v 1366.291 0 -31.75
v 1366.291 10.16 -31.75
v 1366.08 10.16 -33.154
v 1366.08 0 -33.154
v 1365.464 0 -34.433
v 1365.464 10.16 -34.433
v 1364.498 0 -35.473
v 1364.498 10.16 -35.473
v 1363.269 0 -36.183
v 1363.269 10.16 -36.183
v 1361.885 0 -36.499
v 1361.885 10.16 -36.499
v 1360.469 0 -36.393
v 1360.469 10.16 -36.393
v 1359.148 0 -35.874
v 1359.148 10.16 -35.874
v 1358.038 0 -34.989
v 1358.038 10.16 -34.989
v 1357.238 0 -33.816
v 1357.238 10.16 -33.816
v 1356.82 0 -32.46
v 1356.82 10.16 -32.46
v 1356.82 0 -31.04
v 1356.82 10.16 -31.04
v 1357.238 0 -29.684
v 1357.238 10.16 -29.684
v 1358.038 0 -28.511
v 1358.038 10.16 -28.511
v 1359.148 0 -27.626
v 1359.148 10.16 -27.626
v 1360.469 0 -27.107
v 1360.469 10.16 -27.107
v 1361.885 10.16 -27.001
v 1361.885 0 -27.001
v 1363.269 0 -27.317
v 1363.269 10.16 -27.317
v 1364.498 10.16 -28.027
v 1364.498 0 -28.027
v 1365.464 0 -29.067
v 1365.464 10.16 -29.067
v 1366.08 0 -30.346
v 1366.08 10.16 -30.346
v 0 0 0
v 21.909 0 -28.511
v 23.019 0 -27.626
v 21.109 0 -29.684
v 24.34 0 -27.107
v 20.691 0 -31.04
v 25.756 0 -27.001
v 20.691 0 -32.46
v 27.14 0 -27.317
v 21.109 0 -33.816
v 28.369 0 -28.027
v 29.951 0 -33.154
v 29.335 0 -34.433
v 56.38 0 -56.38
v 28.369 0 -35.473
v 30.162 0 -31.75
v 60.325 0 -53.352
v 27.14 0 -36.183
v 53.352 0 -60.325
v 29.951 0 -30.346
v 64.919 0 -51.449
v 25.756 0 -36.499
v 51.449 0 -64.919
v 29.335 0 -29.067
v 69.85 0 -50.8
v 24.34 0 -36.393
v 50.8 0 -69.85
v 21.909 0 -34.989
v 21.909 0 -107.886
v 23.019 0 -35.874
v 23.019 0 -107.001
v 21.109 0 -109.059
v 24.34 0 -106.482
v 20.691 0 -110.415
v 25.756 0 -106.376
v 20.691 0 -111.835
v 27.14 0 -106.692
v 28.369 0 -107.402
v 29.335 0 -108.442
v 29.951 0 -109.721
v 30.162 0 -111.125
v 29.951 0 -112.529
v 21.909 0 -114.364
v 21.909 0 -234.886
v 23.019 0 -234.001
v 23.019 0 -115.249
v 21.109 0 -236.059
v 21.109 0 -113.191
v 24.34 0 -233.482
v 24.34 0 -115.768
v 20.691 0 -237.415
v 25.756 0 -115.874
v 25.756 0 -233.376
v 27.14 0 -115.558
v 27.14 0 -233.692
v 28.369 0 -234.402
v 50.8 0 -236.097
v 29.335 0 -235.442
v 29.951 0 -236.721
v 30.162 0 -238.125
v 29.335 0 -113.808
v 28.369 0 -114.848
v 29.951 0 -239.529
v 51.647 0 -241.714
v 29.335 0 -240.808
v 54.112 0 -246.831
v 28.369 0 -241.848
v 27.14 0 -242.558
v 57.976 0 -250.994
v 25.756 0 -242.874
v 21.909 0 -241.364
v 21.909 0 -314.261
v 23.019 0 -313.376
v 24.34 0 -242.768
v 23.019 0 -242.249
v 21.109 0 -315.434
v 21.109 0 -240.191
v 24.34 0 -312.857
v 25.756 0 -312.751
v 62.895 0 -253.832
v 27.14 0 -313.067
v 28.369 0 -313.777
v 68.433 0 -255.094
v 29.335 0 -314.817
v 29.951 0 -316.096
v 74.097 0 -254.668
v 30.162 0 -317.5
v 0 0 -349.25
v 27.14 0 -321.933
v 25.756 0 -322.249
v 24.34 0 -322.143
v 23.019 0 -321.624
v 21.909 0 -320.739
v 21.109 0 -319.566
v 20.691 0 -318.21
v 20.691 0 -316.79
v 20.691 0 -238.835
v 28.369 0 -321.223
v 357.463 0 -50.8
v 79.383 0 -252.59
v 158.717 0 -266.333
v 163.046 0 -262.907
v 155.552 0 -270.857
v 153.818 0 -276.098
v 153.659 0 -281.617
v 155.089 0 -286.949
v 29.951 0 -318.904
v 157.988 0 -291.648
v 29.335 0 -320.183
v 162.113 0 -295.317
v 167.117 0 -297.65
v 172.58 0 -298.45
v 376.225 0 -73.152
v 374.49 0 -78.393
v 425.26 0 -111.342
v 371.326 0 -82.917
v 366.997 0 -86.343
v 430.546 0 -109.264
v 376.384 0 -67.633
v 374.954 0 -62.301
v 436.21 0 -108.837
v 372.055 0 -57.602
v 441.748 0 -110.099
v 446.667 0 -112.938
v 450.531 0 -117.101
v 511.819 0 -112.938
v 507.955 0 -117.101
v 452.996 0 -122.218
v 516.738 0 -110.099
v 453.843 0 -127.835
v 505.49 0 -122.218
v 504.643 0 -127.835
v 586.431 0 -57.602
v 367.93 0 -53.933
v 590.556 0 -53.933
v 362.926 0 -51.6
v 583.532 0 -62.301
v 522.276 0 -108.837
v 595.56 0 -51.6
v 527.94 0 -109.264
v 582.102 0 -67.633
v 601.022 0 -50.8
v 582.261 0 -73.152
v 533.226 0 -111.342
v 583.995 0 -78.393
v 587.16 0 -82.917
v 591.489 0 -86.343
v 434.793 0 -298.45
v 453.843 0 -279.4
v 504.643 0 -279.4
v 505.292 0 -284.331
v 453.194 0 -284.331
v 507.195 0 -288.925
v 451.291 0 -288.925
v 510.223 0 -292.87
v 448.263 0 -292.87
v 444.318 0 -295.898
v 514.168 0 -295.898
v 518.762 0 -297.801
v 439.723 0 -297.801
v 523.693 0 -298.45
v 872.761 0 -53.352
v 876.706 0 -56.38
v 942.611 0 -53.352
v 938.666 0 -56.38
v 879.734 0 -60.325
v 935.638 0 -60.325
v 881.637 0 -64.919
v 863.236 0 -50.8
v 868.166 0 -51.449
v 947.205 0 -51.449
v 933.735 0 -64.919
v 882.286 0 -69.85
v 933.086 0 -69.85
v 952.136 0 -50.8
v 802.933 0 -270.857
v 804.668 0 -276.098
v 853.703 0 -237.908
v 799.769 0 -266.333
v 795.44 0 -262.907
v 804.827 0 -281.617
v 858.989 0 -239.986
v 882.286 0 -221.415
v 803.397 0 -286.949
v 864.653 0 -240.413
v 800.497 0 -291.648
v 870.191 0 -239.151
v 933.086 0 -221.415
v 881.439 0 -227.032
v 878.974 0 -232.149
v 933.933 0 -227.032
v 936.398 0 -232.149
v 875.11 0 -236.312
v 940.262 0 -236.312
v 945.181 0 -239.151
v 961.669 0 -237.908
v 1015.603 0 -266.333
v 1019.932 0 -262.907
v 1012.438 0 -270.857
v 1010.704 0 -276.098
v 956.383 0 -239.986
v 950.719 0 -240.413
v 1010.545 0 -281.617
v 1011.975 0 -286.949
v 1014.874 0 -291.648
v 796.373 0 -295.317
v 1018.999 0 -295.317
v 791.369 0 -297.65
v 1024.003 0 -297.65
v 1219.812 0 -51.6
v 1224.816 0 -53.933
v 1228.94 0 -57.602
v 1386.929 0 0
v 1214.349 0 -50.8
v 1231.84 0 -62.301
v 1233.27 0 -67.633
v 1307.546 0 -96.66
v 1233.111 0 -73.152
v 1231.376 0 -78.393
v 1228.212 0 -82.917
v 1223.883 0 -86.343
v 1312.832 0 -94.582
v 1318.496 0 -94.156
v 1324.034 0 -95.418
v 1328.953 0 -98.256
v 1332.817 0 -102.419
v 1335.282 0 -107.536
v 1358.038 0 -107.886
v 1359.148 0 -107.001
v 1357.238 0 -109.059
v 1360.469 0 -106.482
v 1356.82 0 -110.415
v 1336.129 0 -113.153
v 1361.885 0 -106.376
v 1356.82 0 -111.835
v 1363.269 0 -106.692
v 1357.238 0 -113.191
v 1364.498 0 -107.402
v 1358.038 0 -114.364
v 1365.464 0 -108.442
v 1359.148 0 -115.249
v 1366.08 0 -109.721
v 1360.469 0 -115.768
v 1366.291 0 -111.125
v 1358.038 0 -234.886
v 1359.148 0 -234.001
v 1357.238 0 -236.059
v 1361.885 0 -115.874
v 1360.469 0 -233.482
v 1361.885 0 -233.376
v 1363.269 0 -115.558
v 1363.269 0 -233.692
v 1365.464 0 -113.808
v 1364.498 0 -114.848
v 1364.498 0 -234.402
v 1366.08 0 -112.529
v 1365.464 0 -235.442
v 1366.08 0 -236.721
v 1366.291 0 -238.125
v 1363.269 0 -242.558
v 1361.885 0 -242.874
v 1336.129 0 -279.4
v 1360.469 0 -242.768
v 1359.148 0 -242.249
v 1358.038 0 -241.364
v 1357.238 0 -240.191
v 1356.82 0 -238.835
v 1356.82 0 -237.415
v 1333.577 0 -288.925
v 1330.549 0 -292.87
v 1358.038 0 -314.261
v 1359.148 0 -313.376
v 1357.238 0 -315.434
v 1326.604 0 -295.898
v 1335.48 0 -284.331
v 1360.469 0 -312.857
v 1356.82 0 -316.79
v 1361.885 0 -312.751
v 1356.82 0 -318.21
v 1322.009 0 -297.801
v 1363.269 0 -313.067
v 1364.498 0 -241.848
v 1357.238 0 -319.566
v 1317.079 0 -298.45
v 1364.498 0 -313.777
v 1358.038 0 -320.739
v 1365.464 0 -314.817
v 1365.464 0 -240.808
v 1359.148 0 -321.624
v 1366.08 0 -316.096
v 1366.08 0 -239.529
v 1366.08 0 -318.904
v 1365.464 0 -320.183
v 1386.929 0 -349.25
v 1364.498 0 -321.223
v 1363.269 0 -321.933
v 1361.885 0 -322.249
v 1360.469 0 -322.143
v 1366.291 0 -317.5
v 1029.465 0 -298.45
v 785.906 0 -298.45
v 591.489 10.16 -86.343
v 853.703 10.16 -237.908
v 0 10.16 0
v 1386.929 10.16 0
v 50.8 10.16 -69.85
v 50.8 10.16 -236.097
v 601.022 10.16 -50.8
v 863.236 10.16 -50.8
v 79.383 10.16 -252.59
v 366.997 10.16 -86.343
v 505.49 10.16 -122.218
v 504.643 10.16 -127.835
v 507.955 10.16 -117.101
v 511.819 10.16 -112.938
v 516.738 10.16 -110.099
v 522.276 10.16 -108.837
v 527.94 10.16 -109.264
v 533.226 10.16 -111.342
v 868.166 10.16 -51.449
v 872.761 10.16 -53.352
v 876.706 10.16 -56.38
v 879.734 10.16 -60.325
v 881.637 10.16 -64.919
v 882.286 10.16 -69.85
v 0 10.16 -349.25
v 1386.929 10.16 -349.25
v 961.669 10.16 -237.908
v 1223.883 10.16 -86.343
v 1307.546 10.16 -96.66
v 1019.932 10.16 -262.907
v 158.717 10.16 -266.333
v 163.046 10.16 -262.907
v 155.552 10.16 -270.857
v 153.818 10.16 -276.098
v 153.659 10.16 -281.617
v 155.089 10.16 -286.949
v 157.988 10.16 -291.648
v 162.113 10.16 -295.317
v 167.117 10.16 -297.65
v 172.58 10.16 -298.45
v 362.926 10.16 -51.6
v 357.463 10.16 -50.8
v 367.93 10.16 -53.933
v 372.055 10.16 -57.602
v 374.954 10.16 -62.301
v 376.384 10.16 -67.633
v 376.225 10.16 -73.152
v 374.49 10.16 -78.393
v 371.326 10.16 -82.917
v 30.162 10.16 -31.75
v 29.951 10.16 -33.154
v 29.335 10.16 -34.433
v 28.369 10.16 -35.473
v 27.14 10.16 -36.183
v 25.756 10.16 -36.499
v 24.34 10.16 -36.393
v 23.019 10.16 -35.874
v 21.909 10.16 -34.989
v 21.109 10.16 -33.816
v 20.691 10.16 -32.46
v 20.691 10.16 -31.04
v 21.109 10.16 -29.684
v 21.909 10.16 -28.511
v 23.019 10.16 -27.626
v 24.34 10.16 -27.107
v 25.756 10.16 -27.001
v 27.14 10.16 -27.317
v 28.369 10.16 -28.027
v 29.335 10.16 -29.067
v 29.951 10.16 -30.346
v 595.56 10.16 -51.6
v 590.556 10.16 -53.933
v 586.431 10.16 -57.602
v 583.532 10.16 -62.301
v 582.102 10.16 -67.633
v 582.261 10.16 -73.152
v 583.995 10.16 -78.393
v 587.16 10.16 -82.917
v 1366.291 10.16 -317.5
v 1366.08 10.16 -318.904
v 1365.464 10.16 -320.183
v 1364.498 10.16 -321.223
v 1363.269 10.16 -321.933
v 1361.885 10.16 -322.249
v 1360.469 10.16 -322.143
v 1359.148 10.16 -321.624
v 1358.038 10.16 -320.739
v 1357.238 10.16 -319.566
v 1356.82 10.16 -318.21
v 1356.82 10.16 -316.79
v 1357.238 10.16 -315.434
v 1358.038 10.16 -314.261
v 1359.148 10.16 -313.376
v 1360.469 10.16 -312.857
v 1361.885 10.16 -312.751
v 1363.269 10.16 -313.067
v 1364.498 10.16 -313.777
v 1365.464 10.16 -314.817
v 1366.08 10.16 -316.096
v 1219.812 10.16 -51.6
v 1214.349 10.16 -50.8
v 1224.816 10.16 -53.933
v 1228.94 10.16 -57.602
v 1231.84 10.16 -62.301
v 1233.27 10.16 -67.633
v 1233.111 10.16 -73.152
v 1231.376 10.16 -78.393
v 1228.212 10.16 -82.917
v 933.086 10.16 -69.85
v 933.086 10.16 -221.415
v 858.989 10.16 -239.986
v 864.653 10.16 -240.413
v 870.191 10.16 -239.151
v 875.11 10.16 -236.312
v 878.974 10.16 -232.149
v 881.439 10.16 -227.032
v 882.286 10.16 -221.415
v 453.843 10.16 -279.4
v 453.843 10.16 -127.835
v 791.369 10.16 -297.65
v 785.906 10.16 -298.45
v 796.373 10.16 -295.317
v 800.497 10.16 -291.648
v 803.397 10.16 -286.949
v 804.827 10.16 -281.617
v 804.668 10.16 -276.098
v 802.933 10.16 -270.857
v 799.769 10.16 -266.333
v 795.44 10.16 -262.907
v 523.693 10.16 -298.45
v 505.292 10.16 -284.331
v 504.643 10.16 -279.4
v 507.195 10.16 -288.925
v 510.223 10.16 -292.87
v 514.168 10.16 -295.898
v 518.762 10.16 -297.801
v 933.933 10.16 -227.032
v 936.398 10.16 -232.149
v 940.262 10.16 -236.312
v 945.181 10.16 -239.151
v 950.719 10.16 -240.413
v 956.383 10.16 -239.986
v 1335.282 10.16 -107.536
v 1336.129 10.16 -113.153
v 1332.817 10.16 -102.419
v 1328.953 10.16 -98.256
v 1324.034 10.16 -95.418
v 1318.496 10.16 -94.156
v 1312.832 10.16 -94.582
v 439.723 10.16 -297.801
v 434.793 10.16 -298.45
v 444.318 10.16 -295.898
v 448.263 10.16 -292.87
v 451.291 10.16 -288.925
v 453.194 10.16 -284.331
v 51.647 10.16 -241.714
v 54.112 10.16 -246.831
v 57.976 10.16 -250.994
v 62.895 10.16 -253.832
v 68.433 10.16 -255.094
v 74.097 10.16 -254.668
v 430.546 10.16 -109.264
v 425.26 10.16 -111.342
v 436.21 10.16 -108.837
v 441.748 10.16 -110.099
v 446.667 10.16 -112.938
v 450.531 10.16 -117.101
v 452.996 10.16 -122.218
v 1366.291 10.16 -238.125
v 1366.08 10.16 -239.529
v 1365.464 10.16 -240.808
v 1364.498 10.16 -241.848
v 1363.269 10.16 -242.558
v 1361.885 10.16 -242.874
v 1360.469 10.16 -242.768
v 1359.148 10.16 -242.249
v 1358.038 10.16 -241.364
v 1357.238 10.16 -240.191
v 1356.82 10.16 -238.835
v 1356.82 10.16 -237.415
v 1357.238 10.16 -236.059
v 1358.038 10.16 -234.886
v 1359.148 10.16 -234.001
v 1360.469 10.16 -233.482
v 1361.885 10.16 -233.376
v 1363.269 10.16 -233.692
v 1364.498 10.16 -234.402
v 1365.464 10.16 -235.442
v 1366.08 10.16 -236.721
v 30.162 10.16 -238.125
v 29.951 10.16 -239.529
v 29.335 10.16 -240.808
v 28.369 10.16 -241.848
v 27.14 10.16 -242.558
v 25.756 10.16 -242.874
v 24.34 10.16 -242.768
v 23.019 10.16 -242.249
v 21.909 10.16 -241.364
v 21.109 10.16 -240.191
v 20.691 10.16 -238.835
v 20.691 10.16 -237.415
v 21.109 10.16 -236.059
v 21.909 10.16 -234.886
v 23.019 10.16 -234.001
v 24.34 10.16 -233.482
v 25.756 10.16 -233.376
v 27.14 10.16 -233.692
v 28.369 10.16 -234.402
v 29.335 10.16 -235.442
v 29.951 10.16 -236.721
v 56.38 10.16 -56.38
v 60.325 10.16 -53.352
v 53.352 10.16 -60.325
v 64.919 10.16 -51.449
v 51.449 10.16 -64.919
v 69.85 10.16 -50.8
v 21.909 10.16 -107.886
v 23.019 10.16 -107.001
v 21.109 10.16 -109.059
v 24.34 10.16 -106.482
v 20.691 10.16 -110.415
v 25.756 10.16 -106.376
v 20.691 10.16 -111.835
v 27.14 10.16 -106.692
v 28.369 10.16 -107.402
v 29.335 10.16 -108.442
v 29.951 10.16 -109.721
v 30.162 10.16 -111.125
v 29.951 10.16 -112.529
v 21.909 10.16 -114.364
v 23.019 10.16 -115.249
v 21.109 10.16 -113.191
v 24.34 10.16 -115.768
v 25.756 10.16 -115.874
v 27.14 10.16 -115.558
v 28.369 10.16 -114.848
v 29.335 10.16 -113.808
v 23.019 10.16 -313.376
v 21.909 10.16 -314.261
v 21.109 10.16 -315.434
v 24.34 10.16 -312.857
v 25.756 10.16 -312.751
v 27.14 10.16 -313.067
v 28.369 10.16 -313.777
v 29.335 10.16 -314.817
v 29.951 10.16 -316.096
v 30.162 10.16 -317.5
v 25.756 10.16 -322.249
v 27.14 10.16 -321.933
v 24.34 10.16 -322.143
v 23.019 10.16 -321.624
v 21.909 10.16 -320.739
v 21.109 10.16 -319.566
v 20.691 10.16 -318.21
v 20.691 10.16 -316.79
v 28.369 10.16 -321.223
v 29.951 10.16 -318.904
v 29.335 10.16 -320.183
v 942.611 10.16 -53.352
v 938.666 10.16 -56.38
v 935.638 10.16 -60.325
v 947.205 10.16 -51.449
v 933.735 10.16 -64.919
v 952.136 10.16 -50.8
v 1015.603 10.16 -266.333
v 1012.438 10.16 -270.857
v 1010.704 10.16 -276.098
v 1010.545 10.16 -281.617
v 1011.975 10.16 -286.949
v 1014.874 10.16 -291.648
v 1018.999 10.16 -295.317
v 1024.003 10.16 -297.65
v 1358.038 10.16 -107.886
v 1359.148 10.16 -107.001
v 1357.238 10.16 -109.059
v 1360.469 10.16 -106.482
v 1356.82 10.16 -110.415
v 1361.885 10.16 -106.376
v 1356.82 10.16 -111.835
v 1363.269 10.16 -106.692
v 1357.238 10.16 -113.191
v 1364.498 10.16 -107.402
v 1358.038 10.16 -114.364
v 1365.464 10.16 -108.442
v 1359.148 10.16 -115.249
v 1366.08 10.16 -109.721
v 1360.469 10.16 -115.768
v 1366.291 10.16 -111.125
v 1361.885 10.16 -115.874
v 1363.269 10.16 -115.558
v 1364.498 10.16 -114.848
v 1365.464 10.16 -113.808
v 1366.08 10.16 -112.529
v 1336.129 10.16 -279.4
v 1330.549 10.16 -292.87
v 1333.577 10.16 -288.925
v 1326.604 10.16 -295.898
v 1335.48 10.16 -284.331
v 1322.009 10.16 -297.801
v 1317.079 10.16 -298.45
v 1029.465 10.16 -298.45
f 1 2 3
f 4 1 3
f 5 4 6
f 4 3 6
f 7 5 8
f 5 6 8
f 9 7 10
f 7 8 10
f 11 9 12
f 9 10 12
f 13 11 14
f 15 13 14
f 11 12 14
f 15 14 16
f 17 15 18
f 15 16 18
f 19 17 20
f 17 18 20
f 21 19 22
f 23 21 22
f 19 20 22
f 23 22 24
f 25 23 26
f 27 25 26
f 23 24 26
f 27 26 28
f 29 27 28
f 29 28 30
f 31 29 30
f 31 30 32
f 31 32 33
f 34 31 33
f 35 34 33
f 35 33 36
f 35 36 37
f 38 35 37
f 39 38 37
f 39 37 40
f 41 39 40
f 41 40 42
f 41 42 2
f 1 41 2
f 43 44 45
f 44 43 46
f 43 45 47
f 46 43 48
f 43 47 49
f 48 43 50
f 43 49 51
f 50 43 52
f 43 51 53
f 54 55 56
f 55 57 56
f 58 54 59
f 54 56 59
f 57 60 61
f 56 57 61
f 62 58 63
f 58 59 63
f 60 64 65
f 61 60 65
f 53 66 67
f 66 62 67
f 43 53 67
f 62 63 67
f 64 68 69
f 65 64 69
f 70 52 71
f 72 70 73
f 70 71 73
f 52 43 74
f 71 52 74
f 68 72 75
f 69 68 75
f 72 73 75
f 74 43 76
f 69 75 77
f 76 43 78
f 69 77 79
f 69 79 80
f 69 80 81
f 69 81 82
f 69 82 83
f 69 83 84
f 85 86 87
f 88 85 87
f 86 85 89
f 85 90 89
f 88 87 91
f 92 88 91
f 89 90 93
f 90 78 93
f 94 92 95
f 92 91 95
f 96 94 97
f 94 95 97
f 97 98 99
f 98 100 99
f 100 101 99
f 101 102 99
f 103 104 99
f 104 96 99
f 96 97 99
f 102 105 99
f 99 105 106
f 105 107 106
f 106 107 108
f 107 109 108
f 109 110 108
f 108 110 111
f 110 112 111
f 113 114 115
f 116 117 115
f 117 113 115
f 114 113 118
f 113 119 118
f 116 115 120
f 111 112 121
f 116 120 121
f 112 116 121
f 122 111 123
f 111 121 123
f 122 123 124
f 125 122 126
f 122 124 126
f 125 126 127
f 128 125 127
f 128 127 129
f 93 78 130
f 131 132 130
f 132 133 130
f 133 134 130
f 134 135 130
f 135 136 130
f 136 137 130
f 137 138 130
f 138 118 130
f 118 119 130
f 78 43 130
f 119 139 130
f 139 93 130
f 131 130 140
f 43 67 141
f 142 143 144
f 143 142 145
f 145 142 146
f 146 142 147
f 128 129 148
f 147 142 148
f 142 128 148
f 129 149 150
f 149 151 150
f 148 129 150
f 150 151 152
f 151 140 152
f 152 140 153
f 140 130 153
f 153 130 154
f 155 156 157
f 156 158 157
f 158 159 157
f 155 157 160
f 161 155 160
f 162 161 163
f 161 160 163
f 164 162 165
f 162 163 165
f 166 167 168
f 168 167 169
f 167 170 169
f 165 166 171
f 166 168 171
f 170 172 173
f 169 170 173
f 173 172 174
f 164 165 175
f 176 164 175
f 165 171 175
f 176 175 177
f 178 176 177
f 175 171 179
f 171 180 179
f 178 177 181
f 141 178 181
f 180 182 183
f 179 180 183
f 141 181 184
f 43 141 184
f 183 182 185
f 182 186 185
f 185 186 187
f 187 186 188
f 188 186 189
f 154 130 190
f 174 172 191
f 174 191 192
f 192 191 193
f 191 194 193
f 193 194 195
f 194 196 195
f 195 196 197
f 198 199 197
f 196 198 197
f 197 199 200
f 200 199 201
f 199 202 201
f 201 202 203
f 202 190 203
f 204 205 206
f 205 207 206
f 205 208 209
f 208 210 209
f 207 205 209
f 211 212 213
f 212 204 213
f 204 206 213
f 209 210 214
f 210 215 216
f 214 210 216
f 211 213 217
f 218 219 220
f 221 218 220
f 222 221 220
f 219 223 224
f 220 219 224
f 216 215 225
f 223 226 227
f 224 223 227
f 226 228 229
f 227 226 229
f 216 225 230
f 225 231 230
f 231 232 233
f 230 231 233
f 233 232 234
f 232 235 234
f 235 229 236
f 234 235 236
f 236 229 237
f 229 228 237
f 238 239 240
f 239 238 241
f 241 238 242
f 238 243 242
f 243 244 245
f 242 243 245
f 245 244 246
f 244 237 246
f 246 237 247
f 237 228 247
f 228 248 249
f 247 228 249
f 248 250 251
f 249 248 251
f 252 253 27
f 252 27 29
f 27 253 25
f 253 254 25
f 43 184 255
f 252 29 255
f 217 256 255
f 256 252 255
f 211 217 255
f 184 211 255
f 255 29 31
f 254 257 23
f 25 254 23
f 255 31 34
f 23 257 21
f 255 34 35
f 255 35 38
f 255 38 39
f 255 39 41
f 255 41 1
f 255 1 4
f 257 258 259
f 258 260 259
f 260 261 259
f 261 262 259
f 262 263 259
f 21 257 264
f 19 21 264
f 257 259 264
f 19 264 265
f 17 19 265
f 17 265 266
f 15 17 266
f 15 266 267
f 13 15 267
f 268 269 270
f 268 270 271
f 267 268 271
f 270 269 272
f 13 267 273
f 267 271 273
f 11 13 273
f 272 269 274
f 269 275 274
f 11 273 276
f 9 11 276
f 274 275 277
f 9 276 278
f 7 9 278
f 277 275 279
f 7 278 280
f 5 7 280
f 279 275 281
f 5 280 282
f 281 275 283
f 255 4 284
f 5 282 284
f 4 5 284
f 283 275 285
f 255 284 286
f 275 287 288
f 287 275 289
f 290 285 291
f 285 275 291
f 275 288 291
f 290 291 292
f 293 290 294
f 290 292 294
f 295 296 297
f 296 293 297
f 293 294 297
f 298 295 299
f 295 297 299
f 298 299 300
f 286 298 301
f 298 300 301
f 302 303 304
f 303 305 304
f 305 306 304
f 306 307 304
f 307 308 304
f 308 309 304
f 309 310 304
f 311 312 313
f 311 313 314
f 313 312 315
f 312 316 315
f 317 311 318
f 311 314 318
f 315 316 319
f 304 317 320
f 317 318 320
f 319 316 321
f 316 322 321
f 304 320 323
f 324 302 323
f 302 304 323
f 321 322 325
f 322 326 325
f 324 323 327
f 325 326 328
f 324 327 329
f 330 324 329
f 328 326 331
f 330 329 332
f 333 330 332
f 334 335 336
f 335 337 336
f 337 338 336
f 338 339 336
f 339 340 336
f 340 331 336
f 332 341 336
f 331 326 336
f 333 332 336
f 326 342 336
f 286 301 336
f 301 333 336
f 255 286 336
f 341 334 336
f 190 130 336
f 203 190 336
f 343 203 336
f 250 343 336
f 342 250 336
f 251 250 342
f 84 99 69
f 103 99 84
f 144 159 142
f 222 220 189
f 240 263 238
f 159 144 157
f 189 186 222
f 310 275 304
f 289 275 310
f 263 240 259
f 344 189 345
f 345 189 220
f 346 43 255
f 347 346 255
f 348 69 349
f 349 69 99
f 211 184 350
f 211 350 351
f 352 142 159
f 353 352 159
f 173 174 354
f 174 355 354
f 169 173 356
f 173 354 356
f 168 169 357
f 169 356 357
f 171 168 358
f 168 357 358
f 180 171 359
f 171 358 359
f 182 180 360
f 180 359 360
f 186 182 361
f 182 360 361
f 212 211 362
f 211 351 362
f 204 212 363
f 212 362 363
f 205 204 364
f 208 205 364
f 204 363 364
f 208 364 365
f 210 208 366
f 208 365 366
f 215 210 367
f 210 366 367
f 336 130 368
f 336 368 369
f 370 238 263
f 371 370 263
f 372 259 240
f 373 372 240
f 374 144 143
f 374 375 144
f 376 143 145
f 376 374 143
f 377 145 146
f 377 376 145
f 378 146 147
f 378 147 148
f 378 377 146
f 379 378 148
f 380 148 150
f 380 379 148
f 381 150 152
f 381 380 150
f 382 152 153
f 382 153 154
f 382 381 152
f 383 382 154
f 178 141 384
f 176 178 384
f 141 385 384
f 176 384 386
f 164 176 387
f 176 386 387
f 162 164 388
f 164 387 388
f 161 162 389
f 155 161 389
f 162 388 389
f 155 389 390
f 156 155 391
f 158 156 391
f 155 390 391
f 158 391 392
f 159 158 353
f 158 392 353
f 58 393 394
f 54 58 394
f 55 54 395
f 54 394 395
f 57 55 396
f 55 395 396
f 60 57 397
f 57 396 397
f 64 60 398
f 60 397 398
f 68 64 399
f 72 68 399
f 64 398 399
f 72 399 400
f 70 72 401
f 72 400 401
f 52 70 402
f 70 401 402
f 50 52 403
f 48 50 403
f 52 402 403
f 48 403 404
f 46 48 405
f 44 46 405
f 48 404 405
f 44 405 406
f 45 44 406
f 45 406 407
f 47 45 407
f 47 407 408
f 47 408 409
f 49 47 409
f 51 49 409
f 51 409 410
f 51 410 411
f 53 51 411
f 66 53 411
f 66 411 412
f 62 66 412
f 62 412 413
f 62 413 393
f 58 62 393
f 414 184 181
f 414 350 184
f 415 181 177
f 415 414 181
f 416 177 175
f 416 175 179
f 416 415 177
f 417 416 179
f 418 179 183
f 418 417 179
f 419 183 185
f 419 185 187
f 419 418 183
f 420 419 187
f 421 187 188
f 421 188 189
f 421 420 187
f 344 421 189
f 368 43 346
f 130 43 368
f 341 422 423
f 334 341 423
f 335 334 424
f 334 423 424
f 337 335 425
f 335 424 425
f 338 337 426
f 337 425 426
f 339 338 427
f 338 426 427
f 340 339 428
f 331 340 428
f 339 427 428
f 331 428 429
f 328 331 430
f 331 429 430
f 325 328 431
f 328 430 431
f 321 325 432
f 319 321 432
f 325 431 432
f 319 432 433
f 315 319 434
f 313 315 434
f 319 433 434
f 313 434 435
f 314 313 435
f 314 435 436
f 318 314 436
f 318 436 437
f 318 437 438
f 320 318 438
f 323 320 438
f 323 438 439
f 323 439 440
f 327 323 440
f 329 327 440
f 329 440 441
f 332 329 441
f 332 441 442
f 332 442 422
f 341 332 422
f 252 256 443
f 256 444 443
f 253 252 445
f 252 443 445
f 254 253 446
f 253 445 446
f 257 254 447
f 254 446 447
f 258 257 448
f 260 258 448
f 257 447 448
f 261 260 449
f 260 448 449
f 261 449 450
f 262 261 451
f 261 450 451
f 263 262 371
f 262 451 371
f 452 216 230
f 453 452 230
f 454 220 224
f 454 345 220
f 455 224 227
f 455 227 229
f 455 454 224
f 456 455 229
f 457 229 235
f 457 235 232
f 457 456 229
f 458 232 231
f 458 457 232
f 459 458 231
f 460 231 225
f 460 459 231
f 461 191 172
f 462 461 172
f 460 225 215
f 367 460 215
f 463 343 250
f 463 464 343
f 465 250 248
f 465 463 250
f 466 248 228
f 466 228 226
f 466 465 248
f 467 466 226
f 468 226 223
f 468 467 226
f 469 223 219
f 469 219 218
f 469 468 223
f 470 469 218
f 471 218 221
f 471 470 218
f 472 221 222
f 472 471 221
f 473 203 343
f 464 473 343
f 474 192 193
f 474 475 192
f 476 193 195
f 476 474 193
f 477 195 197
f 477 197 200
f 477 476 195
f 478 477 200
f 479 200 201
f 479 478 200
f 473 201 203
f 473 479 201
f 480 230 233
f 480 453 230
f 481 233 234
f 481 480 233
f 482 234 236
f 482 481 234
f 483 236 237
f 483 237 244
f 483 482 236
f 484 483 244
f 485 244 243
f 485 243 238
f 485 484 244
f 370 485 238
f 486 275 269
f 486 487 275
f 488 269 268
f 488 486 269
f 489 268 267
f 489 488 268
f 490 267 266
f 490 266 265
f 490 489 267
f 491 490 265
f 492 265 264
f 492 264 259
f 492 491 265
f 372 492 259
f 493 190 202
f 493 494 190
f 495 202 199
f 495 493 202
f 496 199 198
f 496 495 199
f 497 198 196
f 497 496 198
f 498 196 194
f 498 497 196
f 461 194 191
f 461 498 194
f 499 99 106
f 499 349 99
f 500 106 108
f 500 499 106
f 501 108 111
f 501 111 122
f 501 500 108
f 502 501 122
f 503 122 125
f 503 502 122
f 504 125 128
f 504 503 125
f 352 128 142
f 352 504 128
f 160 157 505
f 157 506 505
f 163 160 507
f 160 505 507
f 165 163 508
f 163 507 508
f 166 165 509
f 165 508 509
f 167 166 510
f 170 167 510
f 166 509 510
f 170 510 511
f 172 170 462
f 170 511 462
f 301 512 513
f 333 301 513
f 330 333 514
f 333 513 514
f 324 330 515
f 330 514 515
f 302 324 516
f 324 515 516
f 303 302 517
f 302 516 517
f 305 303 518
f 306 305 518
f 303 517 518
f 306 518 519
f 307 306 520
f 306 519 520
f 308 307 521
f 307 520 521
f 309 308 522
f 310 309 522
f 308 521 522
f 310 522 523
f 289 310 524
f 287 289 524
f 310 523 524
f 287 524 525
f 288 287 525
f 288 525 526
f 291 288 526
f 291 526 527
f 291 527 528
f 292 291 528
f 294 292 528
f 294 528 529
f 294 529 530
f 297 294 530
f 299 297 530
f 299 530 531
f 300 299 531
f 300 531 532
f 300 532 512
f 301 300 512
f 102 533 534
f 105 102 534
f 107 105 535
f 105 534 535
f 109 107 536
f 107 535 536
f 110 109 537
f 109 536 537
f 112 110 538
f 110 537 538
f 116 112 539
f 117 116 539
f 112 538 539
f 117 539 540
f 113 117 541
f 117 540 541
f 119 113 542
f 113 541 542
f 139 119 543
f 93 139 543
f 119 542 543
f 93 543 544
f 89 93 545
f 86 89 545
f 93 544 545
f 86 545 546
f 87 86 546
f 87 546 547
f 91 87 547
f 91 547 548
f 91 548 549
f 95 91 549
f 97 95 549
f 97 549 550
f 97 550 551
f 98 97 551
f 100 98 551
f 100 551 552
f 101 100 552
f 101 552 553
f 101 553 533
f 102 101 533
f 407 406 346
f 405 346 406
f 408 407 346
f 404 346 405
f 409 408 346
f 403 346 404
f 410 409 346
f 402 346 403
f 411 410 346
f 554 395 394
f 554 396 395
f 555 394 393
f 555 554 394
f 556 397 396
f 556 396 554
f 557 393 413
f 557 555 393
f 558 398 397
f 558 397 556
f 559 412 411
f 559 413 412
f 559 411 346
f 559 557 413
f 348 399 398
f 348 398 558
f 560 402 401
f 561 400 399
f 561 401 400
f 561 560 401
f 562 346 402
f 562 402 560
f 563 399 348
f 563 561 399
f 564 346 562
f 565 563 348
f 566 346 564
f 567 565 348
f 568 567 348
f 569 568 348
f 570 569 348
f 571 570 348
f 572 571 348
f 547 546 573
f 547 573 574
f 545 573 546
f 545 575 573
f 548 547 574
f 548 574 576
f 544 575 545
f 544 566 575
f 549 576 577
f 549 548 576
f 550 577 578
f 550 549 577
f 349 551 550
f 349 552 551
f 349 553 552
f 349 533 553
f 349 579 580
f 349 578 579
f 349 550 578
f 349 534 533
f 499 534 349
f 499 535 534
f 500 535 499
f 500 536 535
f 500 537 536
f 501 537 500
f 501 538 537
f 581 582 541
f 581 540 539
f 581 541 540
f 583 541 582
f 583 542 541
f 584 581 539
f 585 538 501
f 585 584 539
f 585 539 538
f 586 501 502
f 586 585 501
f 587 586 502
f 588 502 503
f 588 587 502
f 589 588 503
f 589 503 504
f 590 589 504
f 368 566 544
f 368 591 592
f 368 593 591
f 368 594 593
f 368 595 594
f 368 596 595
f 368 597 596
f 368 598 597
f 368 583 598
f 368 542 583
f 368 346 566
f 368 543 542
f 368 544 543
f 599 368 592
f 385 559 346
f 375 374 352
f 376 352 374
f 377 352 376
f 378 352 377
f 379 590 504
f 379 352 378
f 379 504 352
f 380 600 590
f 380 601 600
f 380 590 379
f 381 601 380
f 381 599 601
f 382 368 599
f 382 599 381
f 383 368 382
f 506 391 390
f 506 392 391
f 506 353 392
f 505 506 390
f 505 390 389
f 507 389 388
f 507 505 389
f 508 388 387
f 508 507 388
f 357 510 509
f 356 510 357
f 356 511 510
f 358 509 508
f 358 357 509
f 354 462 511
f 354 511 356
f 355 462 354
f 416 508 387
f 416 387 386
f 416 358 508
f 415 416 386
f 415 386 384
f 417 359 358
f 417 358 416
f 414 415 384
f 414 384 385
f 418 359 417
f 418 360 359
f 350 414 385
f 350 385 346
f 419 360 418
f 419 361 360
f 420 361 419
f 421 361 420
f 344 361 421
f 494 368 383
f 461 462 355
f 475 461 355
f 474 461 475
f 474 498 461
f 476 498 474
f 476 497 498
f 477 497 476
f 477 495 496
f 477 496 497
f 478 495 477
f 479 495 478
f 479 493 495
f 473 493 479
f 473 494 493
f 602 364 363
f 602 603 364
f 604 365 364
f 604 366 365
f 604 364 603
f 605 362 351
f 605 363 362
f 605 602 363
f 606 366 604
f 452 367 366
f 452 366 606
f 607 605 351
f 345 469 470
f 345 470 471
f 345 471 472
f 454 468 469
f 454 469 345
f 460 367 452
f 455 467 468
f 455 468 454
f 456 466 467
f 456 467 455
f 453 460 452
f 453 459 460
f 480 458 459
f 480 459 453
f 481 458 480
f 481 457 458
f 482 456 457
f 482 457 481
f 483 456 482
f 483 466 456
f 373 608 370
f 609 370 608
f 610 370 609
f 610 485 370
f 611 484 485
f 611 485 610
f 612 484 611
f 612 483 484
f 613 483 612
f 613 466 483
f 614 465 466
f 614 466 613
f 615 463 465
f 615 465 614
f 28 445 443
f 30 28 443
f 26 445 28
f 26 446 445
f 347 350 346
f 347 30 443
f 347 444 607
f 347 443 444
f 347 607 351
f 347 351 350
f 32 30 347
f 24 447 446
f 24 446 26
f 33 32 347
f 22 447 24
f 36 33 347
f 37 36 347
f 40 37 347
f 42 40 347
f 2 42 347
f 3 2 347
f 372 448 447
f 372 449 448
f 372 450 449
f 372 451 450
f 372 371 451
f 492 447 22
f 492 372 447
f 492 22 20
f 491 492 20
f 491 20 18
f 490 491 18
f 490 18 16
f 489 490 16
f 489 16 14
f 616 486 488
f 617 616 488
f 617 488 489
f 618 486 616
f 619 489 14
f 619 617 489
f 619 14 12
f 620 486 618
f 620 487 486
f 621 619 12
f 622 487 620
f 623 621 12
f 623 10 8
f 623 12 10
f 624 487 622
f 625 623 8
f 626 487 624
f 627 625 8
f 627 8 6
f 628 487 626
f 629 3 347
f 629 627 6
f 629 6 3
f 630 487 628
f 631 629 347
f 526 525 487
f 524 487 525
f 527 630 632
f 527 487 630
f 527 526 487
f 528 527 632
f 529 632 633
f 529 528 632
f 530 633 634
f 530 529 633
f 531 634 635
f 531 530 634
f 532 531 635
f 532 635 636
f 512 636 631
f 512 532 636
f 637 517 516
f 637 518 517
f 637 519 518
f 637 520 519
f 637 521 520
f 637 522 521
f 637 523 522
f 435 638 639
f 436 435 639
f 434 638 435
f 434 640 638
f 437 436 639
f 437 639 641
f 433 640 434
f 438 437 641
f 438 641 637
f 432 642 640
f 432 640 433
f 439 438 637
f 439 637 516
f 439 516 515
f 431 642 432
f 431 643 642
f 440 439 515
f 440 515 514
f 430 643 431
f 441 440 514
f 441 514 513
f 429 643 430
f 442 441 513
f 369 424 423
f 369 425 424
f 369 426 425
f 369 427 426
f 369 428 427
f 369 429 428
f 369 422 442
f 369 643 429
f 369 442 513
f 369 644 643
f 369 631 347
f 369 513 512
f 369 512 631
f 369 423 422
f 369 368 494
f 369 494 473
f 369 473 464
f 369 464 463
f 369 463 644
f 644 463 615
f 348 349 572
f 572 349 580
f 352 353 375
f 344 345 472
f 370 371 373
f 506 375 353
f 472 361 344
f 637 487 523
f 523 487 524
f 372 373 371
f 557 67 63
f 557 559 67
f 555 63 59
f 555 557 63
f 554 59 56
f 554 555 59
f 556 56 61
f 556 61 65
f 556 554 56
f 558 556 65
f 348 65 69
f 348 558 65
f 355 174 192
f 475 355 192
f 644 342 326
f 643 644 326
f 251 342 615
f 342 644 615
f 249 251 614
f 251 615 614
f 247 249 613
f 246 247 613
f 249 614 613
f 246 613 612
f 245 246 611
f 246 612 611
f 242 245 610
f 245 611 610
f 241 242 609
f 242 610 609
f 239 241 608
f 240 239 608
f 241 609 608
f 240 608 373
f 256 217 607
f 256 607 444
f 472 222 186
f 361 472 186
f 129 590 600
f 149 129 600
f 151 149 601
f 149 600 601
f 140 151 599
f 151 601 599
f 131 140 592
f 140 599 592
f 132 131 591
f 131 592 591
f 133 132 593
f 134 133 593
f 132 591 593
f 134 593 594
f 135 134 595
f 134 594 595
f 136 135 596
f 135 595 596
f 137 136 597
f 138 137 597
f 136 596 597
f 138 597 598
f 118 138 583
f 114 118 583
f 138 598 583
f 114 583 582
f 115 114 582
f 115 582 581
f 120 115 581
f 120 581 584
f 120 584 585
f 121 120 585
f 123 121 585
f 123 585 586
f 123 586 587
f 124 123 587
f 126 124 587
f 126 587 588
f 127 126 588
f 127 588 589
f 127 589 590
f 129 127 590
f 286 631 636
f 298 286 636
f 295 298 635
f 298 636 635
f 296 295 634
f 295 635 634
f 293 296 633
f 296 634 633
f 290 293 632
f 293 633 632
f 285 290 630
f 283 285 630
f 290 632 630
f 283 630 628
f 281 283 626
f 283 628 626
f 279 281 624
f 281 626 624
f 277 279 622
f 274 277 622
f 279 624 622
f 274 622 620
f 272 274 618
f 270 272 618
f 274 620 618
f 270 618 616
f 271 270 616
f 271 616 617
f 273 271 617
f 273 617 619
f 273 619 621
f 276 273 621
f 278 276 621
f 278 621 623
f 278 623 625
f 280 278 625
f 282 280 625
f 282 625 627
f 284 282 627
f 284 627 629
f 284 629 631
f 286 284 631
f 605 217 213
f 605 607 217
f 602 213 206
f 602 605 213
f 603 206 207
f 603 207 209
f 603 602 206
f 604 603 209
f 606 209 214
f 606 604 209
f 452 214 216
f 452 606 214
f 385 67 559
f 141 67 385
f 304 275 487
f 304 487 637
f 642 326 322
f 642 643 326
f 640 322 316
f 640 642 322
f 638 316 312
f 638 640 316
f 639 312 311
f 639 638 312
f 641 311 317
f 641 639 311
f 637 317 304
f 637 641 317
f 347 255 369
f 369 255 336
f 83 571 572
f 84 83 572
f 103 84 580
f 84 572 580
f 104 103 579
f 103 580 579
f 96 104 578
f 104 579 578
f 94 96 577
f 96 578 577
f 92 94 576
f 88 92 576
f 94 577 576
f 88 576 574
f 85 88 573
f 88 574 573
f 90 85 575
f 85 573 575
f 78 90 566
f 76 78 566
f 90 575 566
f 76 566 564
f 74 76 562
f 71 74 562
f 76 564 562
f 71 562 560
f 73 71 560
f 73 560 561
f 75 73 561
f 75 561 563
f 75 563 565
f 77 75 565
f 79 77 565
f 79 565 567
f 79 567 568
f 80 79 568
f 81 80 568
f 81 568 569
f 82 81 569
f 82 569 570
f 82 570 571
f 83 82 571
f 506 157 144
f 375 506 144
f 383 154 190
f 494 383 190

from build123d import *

# Parameters (mm, degrees)
SKETCH1_W           = 1386.9289
SKETCH1_H           = 349.25
SKETCH1_W_2         = 1285.3289
SKETCH1_H_2         = 247.65
BOSS_EXTRUDE1_DEPTH = 10.16
FILLET1_R           = 19.05
SKETCH4_R           = 4.7625
CUT_EXTRUDE1_DEPTH  = 11.16


with BuildPart() as part:
    # Sketch1 → Boss-Extrude1 (new body)
    with BuildSketch(Plane(origin=(0, 0, 0), x_dir=(1, 0, 0), z_dir=(0, 1, 0))):
        with Locations((693.46445, 174.625)):
            Rectangle(SKETCH1_W, SKETCH1_H)
        with Locations((693.46445, 174.625)):
            Rectangle(SKETCH1_W_2, SKETCH1_H_2, mode=Mode.SUBTRACT)
        Polygon((453.842966667, 65.481790785), (50.8, 298.45), (50.8, 269.112055616), (428.487319876, 50.8), (453.842966667, 50.8), align=None)
        Polygon((101.55564679, 298.45), (50.8, 298.45), (453.842966667, 65.481790785), (453.842966667, 94.819735169), align=None)
        Polygon((453.842966667, 94.819735169), (453.842966667, 65.481790785), (453.842966667, 50.8), (479.242966667, 50.8), (479.242966667, 298.45), (453.842966667, 298.45), align=None)
        Polygon((504.642966667, 298.45), (479.242966667, 298.45), (479.242966667, 50.8), (504.642966667, 50.8), (504.642966667, 65.481790785), (504.642966667, 94.819735169), align=None)
        Polygon((882.285933333, 298.45), (856.930286543, 298.45), (504.642966667, 94.819735169), (504.642966667, 65.481790785), (882.285933333, 283.768209215), align=None)
        Polygon((504.642966667, 65.481790785), (504.642966667, 50.8), (529.998613457, 50.8), (882.285933333, 254.430264831), (882.285933333, 283.768209215), align=None)
        Polygon((907.685933333, 298.45), (882.285933333, 298.45), (882.285933333, 283.768209215), (882.285933333, 254.430264831), (882.285933333, 50.8), (907.685933333, 50.8), align=None)
        Polygon((933.085933333, 298.45), (907.685933333, 298.45), (907.685933333, 50.8), (933.085933333, 50.8), (933.085933333, 254.430264831), (933.085933333, 283.768209215), align=None)
        Polygon((1336.1289, 50.8), (933.085933333, 283.768209215), (933.085933333, 254.430264831), (1285.37325321, 50.8), align=None)
        Polygon((958.441580124, 298.45), (933.085933333, 298.45), (933.085933333, 283.768209215), (1336.1289, 50.8), (1336.1289, 80.137944384), align=None)
    extrude(amount=BOSS_EXTRUDE1_DEPTH)

    # Fillet1
    fillet1_edges = [part.edges().sort_by_distance(p)[0] for p in [
        (428.487319876, 5.08, -50.8),
        (50.8, 5.08, -269.112055616),
        (50.8, 5.08, -50.8),
        (1336.1289, 5.08, -80.137944384),
        (1336.1289, 5.08, -298.45),
        (958.441580124, 5.08, -298.45),
        (856.930286543, 5.08, -298.45),
        (504.642966667, 5.08, -298.45),
        (504.642966667, 5.08, -94.819735169),
        (453.842966667, 5.08, -298.45),
        (101.55564679, 5.08, -298.45),
        (453.842966667, 5.08, -94.819735169),
        (529.998613457, 5.08, -50.8),
        (882.285933333, 5.08, -50.8),
        (882.285933333, 5.08, -254.430264831),
        (933.085933333, 5.08, -50.8),
        (1285.37325321, 5.08, -50.8),
        (933.085933333, 5.08, -254.430264831),
    ]]
    fillet(fillet1_edges, radius=FILLET1_R)

    # Sketch4 → Cut-Extrude1 (cut, through all)
    with BuildSketch(Plane(origin=(0, 10.16, 0), x_dir=(1, 0, 0), z_dir=(0, 1, 0))):
        with Locations((25.4, 317.5)):
            Circle(SKETCH4_R)
        with Locations((25.4, 238.125)):
            Circle(SKETCH4_R)
        with Locations((25.4, 111.125)):
            Circle(SKETCH4_R)
        with Locations((25.4, 31.75)):
            Circle(SKETCH4_R)
        with Locations((1361.5289, 31.75)):
            Circle(SKETCH4_R)
        with Locations((1361.5289, 111.125)):
            Circle(SKETCH4_R)
        with Locations((1361.5289, 238.125)):
            Circle(SKETCH4_R)
        with Locations((1361.5289, 317.5)):
            Circle(SKETCH4_R)
    extrude(amount=-CUT_EXTRUDE1_DEPTH, mode=Mode.SUBTRACT)


solid = part.part
